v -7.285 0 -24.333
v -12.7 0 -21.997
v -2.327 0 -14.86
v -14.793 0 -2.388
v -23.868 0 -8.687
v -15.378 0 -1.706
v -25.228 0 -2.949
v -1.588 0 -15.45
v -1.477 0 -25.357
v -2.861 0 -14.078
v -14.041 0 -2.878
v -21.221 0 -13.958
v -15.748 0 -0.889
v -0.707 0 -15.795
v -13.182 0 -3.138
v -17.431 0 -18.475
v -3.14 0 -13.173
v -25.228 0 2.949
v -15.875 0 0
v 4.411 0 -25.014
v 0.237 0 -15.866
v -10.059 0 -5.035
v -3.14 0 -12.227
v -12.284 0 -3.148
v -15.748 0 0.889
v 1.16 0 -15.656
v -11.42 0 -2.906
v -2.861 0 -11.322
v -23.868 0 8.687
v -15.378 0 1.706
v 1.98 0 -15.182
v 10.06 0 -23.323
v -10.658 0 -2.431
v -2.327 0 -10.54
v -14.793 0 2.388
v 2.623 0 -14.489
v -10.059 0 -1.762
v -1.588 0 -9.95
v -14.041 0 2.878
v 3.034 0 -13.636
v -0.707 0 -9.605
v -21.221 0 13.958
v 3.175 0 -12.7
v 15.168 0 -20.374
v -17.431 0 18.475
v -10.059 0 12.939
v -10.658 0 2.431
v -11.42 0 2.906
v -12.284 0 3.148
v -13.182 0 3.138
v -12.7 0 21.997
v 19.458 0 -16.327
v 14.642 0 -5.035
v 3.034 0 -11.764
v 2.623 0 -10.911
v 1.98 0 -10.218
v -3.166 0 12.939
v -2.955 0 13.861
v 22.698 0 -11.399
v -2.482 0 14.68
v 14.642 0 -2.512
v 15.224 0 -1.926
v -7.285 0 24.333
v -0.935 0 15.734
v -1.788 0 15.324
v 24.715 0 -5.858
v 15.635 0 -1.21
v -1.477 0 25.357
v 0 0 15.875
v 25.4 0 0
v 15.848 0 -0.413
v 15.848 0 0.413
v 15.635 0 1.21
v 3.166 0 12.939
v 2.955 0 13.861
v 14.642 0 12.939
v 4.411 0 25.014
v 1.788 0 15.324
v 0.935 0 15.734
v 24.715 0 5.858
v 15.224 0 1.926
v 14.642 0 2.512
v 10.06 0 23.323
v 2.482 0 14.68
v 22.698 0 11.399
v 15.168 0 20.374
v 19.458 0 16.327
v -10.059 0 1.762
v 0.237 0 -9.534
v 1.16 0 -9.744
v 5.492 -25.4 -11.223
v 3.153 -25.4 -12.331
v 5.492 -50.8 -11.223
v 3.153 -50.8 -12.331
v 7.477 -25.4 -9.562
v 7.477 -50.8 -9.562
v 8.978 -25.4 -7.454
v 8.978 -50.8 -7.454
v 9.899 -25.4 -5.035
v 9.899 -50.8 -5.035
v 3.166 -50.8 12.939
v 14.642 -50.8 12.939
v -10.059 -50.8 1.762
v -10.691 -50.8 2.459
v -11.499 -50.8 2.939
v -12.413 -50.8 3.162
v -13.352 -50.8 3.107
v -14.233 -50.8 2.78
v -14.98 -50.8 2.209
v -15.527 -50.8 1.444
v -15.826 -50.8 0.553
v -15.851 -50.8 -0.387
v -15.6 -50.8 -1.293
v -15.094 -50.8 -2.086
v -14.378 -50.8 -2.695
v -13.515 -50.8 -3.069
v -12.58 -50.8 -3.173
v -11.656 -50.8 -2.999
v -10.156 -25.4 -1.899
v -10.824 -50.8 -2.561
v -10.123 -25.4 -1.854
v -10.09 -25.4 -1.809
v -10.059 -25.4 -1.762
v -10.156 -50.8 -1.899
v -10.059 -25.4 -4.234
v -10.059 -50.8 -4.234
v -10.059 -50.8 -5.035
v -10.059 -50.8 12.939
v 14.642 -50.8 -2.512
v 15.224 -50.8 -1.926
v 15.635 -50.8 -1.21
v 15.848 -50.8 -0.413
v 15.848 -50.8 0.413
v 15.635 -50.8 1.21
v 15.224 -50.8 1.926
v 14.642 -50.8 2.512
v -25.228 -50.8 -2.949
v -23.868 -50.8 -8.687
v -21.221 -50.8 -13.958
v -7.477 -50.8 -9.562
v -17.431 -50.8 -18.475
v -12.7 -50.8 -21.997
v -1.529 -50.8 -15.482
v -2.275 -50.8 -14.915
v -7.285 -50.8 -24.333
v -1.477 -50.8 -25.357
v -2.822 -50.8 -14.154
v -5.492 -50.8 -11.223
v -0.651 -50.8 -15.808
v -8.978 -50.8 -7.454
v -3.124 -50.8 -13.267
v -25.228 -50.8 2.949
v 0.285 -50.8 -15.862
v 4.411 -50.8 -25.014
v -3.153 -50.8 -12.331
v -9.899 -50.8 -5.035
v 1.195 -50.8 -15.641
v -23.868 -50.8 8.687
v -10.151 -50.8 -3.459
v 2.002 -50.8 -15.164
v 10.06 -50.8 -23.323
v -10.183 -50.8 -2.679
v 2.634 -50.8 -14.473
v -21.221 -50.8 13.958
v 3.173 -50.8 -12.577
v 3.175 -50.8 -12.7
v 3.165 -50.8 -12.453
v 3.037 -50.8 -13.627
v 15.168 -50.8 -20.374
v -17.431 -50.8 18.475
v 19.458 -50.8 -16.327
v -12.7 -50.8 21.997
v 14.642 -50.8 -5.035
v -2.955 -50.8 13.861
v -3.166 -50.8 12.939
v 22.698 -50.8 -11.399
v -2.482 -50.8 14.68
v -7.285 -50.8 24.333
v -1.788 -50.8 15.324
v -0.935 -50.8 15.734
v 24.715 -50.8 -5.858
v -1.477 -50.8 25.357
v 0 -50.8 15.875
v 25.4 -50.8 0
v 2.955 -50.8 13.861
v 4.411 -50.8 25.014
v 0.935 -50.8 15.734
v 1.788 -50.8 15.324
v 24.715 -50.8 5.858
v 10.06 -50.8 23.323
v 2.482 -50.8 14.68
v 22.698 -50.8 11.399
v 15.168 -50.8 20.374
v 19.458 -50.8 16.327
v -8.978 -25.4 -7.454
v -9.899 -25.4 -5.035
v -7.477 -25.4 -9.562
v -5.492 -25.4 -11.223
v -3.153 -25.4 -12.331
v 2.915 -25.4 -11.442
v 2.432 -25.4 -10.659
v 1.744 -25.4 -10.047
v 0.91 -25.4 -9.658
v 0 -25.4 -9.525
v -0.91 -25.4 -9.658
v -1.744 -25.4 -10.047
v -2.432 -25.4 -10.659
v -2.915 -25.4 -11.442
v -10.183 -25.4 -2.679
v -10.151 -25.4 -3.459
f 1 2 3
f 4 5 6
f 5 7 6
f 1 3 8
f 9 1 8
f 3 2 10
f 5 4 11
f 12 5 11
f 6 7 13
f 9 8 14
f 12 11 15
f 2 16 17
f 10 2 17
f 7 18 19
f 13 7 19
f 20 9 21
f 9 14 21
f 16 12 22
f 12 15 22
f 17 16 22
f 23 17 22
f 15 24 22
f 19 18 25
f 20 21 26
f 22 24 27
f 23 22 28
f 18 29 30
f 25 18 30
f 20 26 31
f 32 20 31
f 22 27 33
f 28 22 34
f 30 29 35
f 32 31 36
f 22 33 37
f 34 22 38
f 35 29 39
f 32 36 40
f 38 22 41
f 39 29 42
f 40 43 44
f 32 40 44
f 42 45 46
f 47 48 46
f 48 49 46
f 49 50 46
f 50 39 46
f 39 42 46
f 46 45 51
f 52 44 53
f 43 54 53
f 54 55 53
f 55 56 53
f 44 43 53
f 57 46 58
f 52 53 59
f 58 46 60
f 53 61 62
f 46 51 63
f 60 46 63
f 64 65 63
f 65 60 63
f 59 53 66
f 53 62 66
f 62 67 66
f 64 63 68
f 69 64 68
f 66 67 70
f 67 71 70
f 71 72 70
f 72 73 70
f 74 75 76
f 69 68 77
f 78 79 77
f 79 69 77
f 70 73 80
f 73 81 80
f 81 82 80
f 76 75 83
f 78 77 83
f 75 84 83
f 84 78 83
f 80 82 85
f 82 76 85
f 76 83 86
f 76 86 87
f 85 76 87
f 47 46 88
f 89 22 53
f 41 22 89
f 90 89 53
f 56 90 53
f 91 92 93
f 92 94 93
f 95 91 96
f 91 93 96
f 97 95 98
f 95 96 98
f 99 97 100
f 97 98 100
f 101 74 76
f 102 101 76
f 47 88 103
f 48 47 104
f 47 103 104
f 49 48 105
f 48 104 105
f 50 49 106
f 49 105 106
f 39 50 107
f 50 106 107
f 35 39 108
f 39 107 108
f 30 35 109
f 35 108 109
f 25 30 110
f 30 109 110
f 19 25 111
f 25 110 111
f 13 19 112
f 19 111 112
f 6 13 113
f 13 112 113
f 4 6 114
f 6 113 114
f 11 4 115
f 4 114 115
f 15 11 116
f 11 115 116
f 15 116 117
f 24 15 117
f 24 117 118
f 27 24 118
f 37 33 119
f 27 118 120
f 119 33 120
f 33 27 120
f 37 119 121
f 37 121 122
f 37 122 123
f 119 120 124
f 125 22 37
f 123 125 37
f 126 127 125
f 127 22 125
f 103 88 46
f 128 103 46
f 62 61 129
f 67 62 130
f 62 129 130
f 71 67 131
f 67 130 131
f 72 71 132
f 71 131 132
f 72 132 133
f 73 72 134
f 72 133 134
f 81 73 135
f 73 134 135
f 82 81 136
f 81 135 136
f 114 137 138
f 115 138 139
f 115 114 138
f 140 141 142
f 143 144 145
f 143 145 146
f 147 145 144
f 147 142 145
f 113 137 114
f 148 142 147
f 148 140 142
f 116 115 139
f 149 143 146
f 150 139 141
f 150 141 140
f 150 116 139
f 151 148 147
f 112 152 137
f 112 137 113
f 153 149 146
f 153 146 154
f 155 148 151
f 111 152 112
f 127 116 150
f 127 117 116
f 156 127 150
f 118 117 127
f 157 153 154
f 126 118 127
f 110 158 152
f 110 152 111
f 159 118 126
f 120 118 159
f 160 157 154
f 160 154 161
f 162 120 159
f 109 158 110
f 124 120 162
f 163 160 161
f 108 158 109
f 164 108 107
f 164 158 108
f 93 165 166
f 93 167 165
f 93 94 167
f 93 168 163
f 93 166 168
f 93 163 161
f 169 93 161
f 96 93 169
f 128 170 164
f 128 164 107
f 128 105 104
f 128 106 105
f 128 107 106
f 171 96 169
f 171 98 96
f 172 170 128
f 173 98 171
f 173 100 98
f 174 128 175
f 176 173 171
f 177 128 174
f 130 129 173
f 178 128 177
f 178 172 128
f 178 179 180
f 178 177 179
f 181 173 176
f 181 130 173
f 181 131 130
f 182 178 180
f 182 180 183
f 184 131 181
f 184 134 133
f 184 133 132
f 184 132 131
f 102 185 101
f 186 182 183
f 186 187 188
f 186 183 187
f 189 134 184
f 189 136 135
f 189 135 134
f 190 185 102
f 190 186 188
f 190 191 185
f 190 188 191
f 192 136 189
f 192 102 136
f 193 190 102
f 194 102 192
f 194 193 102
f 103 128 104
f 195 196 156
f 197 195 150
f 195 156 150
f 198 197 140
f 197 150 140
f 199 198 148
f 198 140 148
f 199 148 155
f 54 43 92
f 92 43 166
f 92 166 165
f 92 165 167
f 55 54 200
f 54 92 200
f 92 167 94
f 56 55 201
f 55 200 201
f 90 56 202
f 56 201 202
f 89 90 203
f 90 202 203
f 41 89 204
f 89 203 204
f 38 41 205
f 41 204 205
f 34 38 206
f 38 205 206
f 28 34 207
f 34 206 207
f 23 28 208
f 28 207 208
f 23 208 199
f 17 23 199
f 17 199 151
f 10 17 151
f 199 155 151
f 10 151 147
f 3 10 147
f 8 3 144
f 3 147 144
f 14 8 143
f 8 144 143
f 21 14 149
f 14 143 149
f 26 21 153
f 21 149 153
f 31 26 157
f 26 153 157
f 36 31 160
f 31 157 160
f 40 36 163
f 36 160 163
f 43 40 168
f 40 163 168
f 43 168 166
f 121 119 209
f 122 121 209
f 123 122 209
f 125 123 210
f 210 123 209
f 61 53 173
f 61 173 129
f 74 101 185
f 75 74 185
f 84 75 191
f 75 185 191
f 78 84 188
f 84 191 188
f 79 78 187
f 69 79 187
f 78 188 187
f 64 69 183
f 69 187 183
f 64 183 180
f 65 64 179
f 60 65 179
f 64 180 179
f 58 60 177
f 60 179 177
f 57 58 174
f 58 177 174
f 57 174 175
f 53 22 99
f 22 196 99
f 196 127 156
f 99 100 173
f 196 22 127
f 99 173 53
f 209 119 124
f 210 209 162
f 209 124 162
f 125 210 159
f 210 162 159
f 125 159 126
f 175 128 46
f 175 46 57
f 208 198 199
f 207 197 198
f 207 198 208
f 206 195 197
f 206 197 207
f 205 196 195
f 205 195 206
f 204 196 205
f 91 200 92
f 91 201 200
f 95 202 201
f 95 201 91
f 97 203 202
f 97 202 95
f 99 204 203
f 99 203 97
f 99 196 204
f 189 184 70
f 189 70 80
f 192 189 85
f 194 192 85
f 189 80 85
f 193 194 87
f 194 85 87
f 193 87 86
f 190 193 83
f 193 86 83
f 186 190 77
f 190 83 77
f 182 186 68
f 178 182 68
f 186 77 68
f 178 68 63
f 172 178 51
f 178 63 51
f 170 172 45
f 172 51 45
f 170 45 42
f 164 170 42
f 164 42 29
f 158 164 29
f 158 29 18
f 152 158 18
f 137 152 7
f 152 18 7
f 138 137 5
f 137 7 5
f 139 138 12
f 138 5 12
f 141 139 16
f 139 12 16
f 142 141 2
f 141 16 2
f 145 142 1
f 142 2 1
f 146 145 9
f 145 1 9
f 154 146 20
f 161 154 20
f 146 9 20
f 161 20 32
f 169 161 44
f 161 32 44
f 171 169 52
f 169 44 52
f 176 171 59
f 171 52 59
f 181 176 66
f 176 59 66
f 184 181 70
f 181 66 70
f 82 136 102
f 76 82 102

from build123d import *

# Parameters (mm, degrees)
F0_R     = 25.4
F1_DEPTH = 50.8
F2_R     = 3.175
F3_DEPTH = 50.8
F4_R     = 10.183326
F5_DEPTH = 25.4
F6_W     = 24.701291
F6_H     = 17.974584
F7_DEPTH = 50.8


with BuildPart() as f1:
    # F0 (on Front) → F1 (new body)
    with BuildSketch(Plane.XZ):
        Circle(F0_R)
    extrude(amount=F1_DEPTH)

    # F2 (on face) → F3 (cut, through all)
    with BuildSketch(Plane.XZ.offset(50.8)):
        with Locations((0, 12.7)):
            Circle(F2_R)
        with Locations((12.7, 0)):
            Circle(F2_R)
        with Locations((0, -12.7)):
            Circle(F2_R)
        with Locations((-12.7, 0)):
            Circle(F2_R)
    extrude(amount=-F3_DEPTH, mode=Mode.SUBTRACT)

    # F4 (on face) → F5 (cut)
    with BuildSketch(Plane.XZ.offset(50.8)):
        with Locations((0, -2.647925)):
            Circle(F4_R)
    extrude(amount=-F5_DEPTH, mode=Mode.SUBTRACT)

    # F6 (on face) → F7 (cut)
    with BuildSketch(Plane.XZ.offset(50.8)):
        with Locations((2.291639, 3.951871)):
            Rectangle(F6_W, F6_H)
    extrude(amount=-F7_DEPTH, mode=Mode.SUBTRACT)


solid = f1.part
